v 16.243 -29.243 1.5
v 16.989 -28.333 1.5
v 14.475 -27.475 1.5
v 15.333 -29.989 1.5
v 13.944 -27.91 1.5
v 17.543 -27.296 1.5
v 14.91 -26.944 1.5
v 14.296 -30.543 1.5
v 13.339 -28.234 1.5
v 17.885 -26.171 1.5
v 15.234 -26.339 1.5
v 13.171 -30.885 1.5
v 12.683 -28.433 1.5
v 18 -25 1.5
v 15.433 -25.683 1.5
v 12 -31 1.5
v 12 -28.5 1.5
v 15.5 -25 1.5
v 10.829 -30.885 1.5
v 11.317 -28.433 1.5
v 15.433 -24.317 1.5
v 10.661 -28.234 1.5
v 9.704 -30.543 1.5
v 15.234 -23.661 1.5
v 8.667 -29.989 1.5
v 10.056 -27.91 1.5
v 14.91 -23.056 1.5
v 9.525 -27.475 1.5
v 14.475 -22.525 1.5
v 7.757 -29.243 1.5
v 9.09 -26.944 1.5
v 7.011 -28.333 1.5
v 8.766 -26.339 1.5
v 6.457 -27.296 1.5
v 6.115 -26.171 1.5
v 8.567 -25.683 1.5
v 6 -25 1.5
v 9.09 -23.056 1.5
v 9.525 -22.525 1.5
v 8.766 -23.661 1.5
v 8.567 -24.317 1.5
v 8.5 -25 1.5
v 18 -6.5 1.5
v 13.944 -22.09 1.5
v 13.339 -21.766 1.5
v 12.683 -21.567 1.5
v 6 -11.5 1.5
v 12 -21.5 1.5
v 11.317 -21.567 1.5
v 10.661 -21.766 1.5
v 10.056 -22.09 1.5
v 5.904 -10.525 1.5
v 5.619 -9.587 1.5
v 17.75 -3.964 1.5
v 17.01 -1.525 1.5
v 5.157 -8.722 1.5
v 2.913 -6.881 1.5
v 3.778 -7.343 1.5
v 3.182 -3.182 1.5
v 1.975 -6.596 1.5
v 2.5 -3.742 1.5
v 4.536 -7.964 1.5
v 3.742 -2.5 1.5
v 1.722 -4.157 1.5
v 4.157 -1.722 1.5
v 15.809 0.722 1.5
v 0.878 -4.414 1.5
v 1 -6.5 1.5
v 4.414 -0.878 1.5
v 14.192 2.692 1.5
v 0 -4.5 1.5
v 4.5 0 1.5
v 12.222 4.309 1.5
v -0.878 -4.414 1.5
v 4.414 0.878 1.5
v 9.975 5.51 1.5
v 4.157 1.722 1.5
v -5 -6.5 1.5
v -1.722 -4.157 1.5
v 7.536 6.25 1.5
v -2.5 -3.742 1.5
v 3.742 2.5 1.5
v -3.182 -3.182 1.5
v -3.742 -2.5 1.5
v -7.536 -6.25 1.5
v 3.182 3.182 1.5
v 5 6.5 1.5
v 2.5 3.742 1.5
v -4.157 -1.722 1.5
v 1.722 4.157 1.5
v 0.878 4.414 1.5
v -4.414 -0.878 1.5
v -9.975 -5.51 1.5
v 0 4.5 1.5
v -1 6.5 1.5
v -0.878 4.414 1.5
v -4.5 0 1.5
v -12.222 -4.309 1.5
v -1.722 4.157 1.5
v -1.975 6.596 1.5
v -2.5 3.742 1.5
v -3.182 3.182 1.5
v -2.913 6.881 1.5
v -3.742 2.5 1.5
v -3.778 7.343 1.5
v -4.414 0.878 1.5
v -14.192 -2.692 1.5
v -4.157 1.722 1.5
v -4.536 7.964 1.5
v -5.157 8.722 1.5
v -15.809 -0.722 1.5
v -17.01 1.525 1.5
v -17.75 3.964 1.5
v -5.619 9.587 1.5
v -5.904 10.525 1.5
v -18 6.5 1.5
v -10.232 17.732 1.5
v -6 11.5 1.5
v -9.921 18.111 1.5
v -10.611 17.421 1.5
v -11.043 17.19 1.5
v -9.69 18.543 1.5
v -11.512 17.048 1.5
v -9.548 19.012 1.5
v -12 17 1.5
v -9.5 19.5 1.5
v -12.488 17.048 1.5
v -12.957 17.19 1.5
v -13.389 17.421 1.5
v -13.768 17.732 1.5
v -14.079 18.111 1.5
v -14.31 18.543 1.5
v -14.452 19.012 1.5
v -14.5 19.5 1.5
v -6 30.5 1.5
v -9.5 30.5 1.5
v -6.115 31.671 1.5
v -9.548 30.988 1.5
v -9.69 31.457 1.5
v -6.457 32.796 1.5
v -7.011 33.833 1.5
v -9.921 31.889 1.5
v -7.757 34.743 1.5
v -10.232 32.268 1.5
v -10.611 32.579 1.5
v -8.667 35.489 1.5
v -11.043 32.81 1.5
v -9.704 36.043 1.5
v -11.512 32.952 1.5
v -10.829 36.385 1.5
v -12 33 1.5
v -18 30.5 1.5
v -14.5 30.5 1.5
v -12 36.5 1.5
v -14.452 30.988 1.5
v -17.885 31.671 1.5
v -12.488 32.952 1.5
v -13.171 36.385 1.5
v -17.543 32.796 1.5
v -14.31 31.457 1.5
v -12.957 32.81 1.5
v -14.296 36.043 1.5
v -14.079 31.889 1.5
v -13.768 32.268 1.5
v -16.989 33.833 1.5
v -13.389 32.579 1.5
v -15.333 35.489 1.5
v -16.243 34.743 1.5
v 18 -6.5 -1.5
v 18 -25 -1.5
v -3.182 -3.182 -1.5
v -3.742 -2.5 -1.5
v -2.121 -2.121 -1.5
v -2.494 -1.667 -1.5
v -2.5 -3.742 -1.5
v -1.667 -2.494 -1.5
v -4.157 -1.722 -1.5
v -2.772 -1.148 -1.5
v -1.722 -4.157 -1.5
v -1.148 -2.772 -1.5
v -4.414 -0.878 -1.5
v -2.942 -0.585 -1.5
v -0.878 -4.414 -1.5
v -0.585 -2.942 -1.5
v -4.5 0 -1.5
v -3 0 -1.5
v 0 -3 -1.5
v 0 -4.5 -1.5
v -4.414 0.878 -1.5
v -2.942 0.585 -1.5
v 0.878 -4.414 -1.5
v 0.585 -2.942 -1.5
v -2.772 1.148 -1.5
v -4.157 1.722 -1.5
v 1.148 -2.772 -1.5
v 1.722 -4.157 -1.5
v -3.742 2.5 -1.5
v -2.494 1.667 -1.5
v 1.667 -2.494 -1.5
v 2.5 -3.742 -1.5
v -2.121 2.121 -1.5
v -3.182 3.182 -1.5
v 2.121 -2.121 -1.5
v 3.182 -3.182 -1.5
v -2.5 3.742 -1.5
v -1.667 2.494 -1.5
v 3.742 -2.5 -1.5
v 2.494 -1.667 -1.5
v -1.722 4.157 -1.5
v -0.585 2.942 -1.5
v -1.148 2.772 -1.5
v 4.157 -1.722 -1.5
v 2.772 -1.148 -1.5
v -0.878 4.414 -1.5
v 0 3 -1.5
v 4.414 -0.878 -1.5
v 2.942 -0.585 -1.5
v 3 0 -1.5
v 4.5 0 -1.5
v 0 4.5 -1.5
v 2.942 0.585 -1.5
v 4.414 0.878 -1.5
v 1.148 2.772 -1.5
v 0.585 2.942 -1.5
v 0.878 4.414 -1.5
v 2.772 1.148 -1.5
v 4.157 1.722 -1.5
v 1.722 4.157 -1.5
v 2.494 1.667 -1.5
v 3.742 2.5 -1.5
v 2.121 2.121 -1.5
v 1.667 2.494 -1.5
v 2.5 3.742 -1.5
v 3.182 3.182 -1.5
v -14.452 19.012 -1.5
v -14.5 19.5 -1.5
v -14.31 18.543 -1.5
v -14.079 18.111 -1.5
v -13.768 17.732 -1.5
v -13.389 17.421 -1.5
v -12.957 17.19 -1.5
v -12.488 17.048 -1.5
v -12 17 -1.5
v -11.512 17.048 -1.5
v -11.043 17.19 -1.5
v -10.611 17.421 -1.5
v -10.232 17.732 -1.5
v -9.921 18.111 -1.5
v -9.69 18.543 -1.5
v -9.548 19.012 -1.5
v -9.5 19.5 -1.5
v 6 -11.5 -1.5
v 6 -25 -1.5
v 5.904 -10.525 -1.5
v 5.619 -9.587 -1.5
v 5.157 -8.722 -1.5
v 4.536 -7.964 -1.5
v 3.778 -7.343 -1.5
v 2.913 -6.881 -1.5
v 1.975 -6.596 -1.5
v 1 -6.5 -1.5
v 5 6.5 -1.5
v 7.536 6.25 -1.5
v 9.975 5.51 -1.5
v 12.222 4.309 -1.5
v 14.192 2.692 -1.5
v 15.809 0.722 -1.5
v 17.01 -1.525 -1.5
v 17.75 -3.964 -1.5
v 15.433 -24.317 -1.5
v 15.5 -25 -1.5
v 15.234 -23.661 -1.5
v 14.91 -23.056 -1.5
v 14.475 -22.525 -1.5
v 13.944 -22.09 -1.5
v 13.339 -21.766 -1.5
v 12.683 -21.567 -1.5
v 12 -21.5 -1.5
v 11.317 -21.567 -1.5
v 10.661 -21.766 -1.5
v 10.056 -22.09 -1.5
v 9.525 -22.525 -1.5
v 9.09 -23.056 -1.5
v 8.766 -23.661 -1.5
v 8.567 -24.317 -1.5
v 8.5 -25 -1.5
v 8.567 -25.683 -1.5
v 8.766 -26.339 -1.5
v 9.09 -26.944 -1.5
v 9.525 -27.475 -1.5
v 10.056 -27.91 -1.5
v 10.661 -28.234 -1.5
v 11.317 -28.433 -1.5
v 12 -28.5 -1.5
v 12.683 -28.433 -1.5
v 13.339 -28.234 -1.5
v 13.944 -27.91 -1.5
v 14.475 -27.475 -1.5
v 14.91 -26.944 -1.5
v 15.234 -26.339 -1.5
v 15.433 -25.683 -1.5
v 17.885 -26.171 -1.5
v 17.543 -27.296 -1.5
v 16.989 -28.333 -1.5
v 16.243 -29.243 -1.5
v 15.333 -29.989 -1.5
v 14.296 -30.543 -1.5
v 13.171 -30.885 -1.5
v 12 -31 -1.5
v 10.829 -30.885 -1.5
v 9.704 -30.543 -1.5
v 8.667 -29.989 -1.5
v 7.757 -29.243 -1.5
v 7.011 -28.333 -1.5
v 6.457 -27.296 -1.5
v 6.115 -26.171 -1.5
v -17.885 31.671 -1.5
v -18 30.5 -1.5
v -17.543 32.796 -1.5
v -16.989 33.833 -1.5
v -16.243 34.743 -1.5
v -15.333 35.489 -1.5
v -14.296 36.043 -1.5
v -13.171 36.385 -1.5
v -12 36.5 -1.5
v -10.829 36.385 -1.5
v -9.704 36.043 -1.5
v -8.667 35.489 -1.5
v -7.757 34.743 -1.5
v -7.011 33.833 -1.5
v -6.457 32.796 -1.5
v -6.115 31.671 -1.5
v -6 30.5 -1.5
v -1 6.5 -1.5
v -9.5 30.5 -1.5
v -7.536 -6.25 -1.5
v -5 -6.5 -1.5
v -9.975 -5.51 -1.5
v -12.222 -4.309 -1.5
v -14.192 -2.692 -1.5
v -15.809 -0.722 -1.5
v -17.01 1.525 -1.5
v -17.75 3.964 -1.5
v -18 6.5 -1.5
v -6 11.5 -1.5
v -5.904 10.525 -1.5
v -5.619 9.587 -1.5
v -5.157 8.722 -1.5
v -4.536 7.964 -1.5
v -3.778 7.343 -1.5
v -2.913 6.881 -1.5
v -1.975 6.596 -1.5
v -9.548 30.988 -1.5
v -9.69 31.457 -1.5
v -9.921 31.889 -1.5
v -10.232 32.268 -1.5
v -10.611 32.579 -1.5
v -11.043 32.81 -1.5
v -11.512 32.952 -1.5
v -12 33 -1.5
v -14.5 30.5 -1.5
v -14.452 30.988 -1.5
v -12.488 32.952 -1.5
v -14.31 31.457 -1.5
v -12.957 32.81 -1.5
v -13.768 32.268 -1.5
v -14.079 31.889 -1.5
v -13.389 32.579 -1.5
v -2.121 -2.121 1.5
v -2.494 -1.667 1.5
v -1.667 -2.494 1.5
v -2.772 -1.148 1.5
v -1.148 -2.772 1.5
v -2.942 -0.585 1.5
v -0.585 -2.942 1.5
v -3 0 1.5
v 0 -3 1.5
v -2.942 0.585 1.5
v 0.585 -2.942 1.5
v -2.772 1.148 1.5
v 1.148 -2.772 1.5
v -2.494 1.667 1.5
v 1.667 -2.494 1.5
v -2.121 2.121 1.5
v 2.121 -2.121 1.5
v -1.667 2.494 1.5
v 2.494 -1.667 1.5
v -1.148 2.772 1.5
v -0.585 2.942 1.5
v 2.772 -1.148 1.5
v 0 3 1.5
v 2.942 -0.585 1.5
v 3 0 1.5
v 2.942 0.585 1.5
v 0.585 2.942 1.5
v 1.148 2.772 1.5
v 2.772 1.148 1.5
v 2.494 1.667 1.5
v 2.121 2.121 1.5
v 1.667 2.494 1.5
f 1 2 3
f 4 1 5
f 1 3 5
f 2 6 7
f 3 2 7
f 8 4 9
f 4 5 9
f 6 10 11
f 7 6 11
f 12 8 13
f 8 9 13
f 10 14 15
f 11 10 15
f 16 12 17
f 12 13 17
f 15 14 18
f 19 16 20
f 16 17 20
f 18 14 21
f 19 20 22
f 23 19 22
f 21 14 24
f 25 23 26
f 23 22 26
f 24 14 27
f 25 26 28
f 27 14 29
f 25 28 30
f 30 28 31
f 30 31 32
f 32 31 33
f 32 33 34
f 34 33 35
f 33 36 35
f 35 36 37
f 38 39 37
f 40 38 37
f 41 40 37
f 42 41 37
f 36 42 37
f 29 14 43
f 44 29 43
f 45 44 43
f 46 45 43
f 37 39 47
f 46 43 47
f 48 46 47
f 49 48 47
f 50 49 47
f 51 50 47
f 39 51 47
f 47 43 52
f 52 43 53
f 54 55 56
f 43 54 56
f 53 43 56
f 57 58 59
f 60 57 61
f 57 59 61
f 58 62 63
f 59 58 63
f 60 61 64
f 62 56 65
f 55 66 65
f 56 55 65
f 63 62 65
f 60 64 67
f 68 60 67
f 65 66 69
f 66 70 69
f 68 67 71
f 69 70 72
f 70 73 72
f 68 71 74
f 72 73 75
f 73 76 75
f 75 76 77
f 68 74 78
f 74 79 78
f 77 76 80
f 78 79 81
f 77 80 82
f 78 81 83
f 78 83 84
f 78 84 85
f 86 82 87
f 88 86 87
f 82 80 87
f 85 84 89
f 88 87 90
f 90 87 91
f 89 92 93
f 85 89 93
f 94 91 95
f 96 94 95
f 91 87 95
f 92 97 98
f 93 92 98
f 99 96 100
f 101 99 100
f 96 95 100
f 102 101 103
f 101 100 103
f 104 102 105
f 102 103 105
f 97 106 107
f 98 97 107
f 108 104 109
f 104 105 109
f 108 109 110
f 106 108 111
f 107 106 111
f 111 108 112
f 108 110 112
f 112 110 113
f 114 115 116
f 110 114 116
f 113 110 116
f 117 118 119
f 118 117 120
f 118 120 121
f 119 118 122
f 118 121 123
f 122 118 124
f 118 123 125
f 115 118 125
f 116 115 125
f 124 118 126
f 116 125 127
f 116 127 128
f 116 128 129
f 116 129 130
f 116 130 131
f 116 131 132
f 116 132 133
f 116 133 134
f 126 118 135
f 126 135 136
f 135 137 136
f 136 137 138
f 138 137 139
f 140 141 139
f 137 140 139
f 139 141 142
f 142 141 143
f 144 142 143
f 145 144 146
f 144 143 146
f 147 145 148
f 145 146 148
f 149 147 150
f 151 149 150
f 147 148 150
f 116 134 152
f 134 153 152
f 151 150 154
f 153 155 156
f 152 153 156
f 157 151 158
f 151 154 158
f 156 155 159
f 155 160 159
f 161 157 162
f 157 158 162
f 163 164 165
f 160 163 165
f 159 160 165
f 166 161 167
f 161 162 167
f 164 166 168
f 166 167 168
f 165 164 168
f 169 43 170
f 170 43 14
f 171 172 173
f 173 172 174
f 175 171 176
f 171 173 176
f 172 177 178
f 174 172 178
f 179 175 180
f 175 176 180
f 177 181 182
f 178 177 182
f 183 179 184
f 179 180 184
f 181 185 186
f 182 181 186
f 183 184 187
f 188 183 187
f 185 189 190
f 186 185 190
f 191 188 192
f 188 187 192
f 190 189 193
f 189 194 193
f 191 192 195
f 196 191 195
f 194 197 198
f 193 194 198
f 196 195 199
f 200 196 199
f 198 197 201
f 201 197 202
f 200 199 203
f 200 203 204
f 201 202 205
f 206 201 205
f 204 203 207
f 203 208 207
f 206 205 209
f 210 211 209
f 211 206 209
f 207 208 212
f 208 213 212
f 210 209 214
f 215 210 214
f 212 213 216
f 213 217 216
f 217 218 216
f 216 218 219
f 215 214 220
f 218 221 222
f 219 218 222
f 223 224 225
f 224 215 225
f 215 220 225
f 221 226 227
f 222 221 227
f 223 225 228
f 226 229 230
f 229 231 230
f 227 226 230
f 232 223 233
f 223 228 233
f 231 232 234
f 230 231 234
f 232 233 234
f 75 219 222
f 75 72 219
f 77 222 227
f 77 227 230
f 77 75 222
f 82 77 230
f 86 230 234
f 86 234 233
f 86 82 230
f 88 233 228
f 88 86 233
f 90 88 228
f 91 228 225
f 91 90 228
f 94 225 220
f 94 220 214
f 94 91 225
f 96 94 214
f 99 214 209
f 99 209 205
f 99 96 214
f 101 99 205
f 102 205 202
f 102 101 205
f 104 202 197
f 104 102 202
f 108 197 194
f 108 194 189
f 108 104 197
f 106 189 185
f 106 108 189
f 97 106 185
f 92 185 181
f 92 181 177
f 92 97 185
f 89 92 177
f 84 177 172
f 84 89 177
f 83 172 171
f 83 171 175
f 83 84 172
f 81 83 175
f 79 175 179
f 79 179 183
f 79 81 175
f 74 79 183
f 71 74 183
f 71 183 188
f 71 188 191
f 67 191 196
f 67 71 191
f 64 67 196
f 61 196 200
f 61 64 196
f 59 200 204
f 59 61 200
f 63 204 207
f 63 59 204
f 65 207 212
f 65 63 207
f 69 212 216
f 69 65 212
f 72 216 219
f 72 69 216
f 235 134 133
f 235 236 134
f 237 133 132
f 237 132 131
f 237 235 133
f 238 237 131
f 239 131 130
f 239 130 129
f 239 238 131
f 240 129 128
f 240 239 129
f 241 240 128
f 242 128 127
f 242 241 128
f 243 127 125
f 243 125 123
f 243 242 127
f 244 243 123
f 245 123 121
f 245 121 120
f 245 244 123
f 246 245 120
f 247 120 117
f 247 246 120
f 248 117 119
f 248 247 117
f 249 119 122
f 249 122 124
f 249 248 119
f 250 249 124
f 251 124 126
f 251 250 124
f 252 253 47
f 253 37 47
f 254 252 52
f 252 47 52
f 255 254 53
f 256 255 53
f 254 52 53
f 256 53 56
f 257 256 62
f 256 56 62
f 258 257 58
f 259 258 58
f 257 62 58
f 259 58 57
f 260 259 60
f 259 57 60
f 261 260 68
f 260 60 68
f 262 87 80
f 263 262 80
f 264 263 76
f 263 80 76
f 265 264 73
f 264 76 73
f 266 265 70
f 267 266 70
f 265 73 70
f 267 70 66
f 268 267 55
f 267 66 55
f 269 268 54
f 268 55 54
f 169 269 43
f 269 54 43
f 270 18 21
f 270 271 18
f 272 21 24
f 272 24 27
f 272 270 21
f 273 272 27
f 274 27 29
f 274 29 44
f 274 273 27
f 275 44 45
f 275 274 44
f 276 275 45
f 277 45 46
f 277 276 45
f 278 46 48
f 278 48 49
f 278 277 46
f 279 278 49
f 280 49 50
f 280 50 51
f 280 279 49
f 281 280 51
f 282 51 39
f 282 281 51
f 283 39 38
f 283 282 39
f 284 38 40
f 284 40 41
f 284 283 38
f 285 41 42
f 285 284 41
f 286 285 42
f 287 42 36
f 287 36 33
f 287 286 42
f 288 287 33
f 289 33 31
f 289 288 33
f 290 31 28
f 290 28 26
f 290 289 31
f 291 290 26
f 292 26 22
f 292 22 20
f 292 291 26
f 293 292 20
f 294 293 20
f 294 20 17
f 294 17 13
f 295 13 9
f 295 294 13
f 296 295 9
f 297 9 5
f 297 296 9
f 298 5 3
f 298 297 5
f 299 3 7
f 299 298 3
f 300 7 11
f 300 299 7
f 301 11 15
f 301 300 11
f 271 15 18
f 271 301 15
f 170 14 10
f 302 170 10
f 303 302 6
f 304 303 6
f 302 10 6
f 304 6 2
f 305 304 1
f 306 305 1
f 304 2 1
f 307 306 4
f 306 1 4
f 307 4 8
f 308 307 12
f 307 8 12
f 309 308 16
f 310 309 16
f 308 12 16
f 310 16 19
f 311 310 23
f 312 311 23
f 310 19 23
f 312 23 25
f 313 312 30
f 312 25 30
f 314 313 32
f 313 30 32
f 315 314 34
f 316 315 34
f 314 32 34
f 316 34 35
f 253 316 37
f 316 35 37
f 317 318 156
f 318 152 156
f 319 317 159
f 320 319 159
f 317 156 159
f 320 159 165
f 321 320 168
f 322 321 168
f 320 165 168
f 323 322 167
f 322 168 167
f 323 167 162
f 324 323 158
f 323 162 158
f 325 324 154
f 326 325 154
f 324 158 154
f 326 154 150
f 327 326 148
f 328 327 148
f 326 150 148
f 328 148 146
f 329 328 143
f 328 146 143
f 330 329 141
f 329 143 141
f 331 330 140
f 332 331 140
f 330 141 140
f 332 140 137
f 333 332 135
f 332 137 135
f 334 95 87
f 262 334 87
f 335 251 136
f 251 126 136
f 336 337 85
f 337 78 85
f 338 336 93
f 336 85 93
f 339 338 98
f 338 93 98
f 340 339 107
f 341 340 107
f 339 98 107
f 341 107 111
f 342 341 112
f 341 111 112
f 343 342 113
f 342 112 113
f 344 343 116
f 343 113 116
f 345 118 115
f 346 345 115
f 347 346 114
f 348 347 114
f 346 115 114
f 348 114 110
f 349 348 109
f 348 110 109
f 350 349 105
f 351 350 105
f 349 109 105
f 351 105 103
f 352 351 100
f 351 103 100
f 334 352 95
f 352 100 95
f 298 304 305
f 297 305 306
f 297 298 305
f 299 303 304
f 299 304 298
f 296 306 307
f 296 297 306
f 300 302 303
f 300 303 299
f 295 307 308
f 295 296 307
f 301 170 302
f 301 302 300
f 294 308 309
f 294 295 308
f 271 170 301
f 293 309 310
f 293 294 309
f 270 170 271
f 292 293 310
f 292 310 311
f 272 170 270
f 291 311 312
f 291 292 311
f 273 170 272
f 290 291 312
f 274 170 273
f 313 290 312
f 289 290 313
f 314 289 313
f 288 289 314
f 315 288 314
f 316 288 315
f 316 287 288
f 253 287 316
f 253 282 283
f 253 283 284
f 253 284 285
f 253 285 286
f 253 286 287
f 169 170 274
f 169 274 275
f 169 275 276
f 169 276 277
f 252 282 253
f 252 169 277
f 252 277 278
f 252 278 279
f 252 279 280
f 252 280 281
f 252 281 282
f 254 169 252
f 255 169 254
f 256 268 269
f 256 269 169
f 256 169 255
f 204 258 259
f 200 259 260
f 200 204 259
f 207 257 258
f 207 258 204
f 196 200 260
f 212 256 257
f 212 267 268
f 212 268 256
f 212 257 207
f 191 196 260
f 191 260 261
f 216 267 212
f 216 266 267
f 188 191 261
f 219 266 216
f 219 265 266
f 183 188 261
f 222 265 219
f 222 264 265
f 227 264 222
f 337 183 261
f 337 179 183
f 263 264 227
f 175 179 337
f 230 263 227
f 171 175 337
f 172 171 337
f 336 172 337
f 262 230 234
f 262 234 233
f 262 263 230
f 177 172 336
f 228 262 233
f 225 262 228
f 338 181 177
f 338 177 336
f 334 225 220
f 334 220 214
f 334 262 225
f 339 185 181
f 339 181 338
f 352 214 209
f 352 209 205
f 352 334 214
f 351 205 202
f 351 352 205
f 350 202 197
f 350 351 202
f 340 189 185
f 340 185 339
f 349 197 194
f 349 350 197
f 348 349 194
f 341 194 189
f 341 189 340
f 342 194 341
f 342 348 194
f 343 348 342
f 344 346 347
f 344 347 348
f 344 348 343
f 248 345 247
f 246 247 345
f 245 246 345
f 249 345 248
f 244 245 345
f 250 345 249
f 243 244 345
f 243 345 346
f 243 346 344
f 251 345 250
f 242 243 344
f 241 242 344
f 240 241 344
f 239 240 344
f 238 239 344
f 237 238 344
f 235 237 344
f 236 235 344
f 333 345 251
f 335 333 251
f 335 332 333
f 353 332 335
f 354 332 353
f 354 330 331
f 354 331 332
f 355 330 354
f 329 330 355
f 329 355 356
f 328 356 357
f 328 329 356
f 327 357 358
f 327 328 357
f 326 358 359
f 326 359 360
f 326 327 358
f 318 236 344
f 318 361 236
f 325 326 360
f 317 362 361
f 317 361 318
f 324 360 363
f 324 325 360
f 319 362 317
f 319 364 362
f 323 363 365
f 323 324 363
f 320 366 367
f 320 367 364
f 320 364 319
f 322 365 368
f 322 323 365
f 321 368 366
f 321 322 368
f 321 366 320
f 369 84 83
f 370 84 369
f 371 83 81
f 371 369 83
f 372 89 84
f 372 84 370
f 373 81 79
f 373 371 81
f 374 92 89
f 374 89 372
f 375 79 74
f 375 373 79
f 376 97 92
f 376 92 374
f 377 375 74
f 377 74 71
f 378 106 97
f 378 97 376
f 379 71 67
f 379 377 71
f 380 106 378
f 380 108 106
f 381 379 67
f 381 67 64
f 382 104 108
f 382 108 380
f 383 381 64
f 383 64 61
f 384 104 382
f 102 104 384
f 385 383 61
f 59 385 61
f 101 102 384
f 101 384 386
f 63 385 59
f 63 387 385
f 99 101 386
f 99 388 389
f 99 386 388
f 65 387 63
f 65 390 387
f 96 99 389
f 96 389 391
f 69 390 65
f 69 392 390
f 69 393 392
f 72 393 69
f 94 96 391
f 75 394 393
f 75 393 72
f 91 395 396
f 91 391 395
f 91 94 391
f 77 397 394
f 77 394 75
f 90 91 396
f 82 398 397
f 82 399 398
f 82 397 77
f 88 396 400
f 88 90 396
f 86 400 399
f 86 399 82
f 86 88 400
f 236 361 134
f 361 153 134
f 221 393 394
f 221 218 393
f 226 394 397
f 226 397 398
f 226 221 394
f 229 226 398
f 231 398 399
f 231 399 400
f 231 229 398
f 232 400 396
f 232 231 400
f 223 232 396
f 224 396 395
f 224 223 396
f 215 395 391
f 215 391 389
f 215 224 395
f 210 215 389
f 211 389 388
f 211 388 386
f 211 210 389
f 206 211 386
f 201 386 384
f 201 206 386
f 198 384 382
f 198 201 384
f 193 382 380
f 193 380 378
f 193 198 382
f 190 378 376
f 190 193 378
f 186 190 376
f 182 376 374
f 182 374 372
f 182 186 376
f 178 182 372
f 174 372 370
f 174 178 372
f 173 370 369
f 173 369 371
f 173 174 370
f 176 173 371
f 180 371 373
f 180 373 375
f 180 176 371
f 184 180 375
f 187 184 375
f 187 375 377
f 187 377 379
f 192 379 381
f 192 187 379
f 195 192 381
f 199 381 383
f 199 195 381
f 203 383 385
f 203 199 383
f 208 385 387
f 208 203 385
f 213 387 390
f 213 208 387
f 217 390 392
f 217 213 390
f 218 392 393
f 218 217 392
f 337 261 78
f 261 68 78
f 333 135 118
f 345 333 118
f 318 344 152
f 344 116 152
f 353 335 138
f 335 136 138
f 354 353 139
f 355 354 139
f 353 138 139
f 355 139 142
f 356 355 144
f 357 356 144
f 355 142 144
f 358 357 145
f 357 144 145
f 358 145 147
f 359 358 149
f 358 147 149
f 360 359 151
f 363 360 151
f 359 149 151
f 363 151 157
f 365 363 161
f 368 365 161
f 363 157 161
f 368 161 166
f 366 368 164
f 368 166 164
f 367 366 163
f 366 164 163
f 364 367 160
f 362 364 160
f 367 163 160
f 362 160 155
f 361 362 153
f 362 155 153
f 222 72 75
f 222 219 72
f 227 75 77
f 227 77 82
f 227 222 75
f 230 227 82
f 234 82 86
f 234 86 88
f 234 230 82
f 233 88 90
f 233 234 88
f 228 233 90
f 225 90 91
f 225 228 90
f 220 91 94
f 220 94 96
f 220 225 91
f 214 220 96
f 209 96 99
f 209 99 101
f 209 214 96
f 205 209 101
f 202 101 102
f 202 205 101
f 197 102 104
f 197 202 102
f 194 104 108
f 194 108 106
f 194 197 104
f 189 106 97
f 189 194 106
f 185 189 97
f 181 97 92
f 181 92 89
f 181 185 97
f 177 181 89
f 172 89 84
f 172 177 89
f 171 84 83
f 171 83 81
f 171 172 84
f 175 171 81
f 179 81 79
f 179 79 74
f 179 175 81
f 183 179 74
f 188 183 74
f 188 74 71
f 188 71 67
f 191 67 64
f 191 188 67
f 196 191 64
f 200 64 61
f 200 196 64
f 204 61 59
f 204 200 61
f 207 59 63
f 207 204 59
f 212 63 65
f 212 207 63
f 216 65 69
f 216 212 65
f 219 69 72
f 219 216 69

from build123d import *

# Parameters (mm, degrees)
SKETCH1_R           = 4.5
SKETCH1_R_2         = 3.5
BOSS_EXTRUDE1_DEPTH = 1.5
SKETCH1_4_R         = 4.5
SKETCH1_4_R_2       = 3
BOSS_EXTRUDE2_DEPTH = 1.5


with BuildPart() as part:
    # Sketch1 → Boss-Extrude1 (new, symmetric)
    with BuildSketch(Plane.XY):
        with BuildLine():
            Line((5, 6.5), (-1, 6.5))
            ThreePointArc((-1, 6.5), (-4.535533906, 7.964466094), (-6, 11.5))
            Line((-6, 11.5), (-6, 30.5))
            ThreePointArc((-6, 30.5), (-12, 36.5), (-18, 30.5))
            Line((-18, 30.5), (-18, 6.5))
            ThreePointArc((-18, 6.5), (-14.192388155, -2.692388155), (-5, -6.5))
            Line((-5, -6.5), (1, -6.5))
            ThreePointArc((1, -6.5), (4.535533906, -7.964466094), (6, -11.5))
            Line((6, -11.5), (6, -25))
            ThreePointArc((6, -25), (12, -31), (18, -25))
            Line((18, -25), (18, -6.5))
            ThreePointArc((18, -6.5), (14.192388155, 2.692388155), (5, 6.5))
        make_face()
        Circle(SKETCH1_R, mode=Mode.SUBTRACT)
        with Locations((12, -25)):
            Circle(SKETCH1_R_2, mode=Mode.SUBTRACT)
        with BuildLine():
            ThreePointArc((-14.5, 30.5), (-12, 33), (-9.5, 30.5))
            Line((-9.5, 30.5), (-9.5, 19.5))
            ThreePointArc((-9.5, 19.5), (-12, 17), (-14.5, 19.5))
            Line((-14.5, 19.5), (-14.5, 30.5))
        make_face(mode=Mode.SUBTRACT)
    extrude(amount=BOSS_EXTRUDE1_DEPTH, both=True)


with BuildPart() as body_2:
    # Sketch1<4> → Boss-Extrude2 (new, symmetric)
    with BuildSketch(Plane.XY):
        Circle(SKETCH1_4_R)
        Circle(SKETCH1_4_R_2, mode=Mode.SUBTRACT)
    extrude(amount=BOSS_EXTRUDE2_DEPTH, both=True)


solid = Compound([part.part, body_2.part])
